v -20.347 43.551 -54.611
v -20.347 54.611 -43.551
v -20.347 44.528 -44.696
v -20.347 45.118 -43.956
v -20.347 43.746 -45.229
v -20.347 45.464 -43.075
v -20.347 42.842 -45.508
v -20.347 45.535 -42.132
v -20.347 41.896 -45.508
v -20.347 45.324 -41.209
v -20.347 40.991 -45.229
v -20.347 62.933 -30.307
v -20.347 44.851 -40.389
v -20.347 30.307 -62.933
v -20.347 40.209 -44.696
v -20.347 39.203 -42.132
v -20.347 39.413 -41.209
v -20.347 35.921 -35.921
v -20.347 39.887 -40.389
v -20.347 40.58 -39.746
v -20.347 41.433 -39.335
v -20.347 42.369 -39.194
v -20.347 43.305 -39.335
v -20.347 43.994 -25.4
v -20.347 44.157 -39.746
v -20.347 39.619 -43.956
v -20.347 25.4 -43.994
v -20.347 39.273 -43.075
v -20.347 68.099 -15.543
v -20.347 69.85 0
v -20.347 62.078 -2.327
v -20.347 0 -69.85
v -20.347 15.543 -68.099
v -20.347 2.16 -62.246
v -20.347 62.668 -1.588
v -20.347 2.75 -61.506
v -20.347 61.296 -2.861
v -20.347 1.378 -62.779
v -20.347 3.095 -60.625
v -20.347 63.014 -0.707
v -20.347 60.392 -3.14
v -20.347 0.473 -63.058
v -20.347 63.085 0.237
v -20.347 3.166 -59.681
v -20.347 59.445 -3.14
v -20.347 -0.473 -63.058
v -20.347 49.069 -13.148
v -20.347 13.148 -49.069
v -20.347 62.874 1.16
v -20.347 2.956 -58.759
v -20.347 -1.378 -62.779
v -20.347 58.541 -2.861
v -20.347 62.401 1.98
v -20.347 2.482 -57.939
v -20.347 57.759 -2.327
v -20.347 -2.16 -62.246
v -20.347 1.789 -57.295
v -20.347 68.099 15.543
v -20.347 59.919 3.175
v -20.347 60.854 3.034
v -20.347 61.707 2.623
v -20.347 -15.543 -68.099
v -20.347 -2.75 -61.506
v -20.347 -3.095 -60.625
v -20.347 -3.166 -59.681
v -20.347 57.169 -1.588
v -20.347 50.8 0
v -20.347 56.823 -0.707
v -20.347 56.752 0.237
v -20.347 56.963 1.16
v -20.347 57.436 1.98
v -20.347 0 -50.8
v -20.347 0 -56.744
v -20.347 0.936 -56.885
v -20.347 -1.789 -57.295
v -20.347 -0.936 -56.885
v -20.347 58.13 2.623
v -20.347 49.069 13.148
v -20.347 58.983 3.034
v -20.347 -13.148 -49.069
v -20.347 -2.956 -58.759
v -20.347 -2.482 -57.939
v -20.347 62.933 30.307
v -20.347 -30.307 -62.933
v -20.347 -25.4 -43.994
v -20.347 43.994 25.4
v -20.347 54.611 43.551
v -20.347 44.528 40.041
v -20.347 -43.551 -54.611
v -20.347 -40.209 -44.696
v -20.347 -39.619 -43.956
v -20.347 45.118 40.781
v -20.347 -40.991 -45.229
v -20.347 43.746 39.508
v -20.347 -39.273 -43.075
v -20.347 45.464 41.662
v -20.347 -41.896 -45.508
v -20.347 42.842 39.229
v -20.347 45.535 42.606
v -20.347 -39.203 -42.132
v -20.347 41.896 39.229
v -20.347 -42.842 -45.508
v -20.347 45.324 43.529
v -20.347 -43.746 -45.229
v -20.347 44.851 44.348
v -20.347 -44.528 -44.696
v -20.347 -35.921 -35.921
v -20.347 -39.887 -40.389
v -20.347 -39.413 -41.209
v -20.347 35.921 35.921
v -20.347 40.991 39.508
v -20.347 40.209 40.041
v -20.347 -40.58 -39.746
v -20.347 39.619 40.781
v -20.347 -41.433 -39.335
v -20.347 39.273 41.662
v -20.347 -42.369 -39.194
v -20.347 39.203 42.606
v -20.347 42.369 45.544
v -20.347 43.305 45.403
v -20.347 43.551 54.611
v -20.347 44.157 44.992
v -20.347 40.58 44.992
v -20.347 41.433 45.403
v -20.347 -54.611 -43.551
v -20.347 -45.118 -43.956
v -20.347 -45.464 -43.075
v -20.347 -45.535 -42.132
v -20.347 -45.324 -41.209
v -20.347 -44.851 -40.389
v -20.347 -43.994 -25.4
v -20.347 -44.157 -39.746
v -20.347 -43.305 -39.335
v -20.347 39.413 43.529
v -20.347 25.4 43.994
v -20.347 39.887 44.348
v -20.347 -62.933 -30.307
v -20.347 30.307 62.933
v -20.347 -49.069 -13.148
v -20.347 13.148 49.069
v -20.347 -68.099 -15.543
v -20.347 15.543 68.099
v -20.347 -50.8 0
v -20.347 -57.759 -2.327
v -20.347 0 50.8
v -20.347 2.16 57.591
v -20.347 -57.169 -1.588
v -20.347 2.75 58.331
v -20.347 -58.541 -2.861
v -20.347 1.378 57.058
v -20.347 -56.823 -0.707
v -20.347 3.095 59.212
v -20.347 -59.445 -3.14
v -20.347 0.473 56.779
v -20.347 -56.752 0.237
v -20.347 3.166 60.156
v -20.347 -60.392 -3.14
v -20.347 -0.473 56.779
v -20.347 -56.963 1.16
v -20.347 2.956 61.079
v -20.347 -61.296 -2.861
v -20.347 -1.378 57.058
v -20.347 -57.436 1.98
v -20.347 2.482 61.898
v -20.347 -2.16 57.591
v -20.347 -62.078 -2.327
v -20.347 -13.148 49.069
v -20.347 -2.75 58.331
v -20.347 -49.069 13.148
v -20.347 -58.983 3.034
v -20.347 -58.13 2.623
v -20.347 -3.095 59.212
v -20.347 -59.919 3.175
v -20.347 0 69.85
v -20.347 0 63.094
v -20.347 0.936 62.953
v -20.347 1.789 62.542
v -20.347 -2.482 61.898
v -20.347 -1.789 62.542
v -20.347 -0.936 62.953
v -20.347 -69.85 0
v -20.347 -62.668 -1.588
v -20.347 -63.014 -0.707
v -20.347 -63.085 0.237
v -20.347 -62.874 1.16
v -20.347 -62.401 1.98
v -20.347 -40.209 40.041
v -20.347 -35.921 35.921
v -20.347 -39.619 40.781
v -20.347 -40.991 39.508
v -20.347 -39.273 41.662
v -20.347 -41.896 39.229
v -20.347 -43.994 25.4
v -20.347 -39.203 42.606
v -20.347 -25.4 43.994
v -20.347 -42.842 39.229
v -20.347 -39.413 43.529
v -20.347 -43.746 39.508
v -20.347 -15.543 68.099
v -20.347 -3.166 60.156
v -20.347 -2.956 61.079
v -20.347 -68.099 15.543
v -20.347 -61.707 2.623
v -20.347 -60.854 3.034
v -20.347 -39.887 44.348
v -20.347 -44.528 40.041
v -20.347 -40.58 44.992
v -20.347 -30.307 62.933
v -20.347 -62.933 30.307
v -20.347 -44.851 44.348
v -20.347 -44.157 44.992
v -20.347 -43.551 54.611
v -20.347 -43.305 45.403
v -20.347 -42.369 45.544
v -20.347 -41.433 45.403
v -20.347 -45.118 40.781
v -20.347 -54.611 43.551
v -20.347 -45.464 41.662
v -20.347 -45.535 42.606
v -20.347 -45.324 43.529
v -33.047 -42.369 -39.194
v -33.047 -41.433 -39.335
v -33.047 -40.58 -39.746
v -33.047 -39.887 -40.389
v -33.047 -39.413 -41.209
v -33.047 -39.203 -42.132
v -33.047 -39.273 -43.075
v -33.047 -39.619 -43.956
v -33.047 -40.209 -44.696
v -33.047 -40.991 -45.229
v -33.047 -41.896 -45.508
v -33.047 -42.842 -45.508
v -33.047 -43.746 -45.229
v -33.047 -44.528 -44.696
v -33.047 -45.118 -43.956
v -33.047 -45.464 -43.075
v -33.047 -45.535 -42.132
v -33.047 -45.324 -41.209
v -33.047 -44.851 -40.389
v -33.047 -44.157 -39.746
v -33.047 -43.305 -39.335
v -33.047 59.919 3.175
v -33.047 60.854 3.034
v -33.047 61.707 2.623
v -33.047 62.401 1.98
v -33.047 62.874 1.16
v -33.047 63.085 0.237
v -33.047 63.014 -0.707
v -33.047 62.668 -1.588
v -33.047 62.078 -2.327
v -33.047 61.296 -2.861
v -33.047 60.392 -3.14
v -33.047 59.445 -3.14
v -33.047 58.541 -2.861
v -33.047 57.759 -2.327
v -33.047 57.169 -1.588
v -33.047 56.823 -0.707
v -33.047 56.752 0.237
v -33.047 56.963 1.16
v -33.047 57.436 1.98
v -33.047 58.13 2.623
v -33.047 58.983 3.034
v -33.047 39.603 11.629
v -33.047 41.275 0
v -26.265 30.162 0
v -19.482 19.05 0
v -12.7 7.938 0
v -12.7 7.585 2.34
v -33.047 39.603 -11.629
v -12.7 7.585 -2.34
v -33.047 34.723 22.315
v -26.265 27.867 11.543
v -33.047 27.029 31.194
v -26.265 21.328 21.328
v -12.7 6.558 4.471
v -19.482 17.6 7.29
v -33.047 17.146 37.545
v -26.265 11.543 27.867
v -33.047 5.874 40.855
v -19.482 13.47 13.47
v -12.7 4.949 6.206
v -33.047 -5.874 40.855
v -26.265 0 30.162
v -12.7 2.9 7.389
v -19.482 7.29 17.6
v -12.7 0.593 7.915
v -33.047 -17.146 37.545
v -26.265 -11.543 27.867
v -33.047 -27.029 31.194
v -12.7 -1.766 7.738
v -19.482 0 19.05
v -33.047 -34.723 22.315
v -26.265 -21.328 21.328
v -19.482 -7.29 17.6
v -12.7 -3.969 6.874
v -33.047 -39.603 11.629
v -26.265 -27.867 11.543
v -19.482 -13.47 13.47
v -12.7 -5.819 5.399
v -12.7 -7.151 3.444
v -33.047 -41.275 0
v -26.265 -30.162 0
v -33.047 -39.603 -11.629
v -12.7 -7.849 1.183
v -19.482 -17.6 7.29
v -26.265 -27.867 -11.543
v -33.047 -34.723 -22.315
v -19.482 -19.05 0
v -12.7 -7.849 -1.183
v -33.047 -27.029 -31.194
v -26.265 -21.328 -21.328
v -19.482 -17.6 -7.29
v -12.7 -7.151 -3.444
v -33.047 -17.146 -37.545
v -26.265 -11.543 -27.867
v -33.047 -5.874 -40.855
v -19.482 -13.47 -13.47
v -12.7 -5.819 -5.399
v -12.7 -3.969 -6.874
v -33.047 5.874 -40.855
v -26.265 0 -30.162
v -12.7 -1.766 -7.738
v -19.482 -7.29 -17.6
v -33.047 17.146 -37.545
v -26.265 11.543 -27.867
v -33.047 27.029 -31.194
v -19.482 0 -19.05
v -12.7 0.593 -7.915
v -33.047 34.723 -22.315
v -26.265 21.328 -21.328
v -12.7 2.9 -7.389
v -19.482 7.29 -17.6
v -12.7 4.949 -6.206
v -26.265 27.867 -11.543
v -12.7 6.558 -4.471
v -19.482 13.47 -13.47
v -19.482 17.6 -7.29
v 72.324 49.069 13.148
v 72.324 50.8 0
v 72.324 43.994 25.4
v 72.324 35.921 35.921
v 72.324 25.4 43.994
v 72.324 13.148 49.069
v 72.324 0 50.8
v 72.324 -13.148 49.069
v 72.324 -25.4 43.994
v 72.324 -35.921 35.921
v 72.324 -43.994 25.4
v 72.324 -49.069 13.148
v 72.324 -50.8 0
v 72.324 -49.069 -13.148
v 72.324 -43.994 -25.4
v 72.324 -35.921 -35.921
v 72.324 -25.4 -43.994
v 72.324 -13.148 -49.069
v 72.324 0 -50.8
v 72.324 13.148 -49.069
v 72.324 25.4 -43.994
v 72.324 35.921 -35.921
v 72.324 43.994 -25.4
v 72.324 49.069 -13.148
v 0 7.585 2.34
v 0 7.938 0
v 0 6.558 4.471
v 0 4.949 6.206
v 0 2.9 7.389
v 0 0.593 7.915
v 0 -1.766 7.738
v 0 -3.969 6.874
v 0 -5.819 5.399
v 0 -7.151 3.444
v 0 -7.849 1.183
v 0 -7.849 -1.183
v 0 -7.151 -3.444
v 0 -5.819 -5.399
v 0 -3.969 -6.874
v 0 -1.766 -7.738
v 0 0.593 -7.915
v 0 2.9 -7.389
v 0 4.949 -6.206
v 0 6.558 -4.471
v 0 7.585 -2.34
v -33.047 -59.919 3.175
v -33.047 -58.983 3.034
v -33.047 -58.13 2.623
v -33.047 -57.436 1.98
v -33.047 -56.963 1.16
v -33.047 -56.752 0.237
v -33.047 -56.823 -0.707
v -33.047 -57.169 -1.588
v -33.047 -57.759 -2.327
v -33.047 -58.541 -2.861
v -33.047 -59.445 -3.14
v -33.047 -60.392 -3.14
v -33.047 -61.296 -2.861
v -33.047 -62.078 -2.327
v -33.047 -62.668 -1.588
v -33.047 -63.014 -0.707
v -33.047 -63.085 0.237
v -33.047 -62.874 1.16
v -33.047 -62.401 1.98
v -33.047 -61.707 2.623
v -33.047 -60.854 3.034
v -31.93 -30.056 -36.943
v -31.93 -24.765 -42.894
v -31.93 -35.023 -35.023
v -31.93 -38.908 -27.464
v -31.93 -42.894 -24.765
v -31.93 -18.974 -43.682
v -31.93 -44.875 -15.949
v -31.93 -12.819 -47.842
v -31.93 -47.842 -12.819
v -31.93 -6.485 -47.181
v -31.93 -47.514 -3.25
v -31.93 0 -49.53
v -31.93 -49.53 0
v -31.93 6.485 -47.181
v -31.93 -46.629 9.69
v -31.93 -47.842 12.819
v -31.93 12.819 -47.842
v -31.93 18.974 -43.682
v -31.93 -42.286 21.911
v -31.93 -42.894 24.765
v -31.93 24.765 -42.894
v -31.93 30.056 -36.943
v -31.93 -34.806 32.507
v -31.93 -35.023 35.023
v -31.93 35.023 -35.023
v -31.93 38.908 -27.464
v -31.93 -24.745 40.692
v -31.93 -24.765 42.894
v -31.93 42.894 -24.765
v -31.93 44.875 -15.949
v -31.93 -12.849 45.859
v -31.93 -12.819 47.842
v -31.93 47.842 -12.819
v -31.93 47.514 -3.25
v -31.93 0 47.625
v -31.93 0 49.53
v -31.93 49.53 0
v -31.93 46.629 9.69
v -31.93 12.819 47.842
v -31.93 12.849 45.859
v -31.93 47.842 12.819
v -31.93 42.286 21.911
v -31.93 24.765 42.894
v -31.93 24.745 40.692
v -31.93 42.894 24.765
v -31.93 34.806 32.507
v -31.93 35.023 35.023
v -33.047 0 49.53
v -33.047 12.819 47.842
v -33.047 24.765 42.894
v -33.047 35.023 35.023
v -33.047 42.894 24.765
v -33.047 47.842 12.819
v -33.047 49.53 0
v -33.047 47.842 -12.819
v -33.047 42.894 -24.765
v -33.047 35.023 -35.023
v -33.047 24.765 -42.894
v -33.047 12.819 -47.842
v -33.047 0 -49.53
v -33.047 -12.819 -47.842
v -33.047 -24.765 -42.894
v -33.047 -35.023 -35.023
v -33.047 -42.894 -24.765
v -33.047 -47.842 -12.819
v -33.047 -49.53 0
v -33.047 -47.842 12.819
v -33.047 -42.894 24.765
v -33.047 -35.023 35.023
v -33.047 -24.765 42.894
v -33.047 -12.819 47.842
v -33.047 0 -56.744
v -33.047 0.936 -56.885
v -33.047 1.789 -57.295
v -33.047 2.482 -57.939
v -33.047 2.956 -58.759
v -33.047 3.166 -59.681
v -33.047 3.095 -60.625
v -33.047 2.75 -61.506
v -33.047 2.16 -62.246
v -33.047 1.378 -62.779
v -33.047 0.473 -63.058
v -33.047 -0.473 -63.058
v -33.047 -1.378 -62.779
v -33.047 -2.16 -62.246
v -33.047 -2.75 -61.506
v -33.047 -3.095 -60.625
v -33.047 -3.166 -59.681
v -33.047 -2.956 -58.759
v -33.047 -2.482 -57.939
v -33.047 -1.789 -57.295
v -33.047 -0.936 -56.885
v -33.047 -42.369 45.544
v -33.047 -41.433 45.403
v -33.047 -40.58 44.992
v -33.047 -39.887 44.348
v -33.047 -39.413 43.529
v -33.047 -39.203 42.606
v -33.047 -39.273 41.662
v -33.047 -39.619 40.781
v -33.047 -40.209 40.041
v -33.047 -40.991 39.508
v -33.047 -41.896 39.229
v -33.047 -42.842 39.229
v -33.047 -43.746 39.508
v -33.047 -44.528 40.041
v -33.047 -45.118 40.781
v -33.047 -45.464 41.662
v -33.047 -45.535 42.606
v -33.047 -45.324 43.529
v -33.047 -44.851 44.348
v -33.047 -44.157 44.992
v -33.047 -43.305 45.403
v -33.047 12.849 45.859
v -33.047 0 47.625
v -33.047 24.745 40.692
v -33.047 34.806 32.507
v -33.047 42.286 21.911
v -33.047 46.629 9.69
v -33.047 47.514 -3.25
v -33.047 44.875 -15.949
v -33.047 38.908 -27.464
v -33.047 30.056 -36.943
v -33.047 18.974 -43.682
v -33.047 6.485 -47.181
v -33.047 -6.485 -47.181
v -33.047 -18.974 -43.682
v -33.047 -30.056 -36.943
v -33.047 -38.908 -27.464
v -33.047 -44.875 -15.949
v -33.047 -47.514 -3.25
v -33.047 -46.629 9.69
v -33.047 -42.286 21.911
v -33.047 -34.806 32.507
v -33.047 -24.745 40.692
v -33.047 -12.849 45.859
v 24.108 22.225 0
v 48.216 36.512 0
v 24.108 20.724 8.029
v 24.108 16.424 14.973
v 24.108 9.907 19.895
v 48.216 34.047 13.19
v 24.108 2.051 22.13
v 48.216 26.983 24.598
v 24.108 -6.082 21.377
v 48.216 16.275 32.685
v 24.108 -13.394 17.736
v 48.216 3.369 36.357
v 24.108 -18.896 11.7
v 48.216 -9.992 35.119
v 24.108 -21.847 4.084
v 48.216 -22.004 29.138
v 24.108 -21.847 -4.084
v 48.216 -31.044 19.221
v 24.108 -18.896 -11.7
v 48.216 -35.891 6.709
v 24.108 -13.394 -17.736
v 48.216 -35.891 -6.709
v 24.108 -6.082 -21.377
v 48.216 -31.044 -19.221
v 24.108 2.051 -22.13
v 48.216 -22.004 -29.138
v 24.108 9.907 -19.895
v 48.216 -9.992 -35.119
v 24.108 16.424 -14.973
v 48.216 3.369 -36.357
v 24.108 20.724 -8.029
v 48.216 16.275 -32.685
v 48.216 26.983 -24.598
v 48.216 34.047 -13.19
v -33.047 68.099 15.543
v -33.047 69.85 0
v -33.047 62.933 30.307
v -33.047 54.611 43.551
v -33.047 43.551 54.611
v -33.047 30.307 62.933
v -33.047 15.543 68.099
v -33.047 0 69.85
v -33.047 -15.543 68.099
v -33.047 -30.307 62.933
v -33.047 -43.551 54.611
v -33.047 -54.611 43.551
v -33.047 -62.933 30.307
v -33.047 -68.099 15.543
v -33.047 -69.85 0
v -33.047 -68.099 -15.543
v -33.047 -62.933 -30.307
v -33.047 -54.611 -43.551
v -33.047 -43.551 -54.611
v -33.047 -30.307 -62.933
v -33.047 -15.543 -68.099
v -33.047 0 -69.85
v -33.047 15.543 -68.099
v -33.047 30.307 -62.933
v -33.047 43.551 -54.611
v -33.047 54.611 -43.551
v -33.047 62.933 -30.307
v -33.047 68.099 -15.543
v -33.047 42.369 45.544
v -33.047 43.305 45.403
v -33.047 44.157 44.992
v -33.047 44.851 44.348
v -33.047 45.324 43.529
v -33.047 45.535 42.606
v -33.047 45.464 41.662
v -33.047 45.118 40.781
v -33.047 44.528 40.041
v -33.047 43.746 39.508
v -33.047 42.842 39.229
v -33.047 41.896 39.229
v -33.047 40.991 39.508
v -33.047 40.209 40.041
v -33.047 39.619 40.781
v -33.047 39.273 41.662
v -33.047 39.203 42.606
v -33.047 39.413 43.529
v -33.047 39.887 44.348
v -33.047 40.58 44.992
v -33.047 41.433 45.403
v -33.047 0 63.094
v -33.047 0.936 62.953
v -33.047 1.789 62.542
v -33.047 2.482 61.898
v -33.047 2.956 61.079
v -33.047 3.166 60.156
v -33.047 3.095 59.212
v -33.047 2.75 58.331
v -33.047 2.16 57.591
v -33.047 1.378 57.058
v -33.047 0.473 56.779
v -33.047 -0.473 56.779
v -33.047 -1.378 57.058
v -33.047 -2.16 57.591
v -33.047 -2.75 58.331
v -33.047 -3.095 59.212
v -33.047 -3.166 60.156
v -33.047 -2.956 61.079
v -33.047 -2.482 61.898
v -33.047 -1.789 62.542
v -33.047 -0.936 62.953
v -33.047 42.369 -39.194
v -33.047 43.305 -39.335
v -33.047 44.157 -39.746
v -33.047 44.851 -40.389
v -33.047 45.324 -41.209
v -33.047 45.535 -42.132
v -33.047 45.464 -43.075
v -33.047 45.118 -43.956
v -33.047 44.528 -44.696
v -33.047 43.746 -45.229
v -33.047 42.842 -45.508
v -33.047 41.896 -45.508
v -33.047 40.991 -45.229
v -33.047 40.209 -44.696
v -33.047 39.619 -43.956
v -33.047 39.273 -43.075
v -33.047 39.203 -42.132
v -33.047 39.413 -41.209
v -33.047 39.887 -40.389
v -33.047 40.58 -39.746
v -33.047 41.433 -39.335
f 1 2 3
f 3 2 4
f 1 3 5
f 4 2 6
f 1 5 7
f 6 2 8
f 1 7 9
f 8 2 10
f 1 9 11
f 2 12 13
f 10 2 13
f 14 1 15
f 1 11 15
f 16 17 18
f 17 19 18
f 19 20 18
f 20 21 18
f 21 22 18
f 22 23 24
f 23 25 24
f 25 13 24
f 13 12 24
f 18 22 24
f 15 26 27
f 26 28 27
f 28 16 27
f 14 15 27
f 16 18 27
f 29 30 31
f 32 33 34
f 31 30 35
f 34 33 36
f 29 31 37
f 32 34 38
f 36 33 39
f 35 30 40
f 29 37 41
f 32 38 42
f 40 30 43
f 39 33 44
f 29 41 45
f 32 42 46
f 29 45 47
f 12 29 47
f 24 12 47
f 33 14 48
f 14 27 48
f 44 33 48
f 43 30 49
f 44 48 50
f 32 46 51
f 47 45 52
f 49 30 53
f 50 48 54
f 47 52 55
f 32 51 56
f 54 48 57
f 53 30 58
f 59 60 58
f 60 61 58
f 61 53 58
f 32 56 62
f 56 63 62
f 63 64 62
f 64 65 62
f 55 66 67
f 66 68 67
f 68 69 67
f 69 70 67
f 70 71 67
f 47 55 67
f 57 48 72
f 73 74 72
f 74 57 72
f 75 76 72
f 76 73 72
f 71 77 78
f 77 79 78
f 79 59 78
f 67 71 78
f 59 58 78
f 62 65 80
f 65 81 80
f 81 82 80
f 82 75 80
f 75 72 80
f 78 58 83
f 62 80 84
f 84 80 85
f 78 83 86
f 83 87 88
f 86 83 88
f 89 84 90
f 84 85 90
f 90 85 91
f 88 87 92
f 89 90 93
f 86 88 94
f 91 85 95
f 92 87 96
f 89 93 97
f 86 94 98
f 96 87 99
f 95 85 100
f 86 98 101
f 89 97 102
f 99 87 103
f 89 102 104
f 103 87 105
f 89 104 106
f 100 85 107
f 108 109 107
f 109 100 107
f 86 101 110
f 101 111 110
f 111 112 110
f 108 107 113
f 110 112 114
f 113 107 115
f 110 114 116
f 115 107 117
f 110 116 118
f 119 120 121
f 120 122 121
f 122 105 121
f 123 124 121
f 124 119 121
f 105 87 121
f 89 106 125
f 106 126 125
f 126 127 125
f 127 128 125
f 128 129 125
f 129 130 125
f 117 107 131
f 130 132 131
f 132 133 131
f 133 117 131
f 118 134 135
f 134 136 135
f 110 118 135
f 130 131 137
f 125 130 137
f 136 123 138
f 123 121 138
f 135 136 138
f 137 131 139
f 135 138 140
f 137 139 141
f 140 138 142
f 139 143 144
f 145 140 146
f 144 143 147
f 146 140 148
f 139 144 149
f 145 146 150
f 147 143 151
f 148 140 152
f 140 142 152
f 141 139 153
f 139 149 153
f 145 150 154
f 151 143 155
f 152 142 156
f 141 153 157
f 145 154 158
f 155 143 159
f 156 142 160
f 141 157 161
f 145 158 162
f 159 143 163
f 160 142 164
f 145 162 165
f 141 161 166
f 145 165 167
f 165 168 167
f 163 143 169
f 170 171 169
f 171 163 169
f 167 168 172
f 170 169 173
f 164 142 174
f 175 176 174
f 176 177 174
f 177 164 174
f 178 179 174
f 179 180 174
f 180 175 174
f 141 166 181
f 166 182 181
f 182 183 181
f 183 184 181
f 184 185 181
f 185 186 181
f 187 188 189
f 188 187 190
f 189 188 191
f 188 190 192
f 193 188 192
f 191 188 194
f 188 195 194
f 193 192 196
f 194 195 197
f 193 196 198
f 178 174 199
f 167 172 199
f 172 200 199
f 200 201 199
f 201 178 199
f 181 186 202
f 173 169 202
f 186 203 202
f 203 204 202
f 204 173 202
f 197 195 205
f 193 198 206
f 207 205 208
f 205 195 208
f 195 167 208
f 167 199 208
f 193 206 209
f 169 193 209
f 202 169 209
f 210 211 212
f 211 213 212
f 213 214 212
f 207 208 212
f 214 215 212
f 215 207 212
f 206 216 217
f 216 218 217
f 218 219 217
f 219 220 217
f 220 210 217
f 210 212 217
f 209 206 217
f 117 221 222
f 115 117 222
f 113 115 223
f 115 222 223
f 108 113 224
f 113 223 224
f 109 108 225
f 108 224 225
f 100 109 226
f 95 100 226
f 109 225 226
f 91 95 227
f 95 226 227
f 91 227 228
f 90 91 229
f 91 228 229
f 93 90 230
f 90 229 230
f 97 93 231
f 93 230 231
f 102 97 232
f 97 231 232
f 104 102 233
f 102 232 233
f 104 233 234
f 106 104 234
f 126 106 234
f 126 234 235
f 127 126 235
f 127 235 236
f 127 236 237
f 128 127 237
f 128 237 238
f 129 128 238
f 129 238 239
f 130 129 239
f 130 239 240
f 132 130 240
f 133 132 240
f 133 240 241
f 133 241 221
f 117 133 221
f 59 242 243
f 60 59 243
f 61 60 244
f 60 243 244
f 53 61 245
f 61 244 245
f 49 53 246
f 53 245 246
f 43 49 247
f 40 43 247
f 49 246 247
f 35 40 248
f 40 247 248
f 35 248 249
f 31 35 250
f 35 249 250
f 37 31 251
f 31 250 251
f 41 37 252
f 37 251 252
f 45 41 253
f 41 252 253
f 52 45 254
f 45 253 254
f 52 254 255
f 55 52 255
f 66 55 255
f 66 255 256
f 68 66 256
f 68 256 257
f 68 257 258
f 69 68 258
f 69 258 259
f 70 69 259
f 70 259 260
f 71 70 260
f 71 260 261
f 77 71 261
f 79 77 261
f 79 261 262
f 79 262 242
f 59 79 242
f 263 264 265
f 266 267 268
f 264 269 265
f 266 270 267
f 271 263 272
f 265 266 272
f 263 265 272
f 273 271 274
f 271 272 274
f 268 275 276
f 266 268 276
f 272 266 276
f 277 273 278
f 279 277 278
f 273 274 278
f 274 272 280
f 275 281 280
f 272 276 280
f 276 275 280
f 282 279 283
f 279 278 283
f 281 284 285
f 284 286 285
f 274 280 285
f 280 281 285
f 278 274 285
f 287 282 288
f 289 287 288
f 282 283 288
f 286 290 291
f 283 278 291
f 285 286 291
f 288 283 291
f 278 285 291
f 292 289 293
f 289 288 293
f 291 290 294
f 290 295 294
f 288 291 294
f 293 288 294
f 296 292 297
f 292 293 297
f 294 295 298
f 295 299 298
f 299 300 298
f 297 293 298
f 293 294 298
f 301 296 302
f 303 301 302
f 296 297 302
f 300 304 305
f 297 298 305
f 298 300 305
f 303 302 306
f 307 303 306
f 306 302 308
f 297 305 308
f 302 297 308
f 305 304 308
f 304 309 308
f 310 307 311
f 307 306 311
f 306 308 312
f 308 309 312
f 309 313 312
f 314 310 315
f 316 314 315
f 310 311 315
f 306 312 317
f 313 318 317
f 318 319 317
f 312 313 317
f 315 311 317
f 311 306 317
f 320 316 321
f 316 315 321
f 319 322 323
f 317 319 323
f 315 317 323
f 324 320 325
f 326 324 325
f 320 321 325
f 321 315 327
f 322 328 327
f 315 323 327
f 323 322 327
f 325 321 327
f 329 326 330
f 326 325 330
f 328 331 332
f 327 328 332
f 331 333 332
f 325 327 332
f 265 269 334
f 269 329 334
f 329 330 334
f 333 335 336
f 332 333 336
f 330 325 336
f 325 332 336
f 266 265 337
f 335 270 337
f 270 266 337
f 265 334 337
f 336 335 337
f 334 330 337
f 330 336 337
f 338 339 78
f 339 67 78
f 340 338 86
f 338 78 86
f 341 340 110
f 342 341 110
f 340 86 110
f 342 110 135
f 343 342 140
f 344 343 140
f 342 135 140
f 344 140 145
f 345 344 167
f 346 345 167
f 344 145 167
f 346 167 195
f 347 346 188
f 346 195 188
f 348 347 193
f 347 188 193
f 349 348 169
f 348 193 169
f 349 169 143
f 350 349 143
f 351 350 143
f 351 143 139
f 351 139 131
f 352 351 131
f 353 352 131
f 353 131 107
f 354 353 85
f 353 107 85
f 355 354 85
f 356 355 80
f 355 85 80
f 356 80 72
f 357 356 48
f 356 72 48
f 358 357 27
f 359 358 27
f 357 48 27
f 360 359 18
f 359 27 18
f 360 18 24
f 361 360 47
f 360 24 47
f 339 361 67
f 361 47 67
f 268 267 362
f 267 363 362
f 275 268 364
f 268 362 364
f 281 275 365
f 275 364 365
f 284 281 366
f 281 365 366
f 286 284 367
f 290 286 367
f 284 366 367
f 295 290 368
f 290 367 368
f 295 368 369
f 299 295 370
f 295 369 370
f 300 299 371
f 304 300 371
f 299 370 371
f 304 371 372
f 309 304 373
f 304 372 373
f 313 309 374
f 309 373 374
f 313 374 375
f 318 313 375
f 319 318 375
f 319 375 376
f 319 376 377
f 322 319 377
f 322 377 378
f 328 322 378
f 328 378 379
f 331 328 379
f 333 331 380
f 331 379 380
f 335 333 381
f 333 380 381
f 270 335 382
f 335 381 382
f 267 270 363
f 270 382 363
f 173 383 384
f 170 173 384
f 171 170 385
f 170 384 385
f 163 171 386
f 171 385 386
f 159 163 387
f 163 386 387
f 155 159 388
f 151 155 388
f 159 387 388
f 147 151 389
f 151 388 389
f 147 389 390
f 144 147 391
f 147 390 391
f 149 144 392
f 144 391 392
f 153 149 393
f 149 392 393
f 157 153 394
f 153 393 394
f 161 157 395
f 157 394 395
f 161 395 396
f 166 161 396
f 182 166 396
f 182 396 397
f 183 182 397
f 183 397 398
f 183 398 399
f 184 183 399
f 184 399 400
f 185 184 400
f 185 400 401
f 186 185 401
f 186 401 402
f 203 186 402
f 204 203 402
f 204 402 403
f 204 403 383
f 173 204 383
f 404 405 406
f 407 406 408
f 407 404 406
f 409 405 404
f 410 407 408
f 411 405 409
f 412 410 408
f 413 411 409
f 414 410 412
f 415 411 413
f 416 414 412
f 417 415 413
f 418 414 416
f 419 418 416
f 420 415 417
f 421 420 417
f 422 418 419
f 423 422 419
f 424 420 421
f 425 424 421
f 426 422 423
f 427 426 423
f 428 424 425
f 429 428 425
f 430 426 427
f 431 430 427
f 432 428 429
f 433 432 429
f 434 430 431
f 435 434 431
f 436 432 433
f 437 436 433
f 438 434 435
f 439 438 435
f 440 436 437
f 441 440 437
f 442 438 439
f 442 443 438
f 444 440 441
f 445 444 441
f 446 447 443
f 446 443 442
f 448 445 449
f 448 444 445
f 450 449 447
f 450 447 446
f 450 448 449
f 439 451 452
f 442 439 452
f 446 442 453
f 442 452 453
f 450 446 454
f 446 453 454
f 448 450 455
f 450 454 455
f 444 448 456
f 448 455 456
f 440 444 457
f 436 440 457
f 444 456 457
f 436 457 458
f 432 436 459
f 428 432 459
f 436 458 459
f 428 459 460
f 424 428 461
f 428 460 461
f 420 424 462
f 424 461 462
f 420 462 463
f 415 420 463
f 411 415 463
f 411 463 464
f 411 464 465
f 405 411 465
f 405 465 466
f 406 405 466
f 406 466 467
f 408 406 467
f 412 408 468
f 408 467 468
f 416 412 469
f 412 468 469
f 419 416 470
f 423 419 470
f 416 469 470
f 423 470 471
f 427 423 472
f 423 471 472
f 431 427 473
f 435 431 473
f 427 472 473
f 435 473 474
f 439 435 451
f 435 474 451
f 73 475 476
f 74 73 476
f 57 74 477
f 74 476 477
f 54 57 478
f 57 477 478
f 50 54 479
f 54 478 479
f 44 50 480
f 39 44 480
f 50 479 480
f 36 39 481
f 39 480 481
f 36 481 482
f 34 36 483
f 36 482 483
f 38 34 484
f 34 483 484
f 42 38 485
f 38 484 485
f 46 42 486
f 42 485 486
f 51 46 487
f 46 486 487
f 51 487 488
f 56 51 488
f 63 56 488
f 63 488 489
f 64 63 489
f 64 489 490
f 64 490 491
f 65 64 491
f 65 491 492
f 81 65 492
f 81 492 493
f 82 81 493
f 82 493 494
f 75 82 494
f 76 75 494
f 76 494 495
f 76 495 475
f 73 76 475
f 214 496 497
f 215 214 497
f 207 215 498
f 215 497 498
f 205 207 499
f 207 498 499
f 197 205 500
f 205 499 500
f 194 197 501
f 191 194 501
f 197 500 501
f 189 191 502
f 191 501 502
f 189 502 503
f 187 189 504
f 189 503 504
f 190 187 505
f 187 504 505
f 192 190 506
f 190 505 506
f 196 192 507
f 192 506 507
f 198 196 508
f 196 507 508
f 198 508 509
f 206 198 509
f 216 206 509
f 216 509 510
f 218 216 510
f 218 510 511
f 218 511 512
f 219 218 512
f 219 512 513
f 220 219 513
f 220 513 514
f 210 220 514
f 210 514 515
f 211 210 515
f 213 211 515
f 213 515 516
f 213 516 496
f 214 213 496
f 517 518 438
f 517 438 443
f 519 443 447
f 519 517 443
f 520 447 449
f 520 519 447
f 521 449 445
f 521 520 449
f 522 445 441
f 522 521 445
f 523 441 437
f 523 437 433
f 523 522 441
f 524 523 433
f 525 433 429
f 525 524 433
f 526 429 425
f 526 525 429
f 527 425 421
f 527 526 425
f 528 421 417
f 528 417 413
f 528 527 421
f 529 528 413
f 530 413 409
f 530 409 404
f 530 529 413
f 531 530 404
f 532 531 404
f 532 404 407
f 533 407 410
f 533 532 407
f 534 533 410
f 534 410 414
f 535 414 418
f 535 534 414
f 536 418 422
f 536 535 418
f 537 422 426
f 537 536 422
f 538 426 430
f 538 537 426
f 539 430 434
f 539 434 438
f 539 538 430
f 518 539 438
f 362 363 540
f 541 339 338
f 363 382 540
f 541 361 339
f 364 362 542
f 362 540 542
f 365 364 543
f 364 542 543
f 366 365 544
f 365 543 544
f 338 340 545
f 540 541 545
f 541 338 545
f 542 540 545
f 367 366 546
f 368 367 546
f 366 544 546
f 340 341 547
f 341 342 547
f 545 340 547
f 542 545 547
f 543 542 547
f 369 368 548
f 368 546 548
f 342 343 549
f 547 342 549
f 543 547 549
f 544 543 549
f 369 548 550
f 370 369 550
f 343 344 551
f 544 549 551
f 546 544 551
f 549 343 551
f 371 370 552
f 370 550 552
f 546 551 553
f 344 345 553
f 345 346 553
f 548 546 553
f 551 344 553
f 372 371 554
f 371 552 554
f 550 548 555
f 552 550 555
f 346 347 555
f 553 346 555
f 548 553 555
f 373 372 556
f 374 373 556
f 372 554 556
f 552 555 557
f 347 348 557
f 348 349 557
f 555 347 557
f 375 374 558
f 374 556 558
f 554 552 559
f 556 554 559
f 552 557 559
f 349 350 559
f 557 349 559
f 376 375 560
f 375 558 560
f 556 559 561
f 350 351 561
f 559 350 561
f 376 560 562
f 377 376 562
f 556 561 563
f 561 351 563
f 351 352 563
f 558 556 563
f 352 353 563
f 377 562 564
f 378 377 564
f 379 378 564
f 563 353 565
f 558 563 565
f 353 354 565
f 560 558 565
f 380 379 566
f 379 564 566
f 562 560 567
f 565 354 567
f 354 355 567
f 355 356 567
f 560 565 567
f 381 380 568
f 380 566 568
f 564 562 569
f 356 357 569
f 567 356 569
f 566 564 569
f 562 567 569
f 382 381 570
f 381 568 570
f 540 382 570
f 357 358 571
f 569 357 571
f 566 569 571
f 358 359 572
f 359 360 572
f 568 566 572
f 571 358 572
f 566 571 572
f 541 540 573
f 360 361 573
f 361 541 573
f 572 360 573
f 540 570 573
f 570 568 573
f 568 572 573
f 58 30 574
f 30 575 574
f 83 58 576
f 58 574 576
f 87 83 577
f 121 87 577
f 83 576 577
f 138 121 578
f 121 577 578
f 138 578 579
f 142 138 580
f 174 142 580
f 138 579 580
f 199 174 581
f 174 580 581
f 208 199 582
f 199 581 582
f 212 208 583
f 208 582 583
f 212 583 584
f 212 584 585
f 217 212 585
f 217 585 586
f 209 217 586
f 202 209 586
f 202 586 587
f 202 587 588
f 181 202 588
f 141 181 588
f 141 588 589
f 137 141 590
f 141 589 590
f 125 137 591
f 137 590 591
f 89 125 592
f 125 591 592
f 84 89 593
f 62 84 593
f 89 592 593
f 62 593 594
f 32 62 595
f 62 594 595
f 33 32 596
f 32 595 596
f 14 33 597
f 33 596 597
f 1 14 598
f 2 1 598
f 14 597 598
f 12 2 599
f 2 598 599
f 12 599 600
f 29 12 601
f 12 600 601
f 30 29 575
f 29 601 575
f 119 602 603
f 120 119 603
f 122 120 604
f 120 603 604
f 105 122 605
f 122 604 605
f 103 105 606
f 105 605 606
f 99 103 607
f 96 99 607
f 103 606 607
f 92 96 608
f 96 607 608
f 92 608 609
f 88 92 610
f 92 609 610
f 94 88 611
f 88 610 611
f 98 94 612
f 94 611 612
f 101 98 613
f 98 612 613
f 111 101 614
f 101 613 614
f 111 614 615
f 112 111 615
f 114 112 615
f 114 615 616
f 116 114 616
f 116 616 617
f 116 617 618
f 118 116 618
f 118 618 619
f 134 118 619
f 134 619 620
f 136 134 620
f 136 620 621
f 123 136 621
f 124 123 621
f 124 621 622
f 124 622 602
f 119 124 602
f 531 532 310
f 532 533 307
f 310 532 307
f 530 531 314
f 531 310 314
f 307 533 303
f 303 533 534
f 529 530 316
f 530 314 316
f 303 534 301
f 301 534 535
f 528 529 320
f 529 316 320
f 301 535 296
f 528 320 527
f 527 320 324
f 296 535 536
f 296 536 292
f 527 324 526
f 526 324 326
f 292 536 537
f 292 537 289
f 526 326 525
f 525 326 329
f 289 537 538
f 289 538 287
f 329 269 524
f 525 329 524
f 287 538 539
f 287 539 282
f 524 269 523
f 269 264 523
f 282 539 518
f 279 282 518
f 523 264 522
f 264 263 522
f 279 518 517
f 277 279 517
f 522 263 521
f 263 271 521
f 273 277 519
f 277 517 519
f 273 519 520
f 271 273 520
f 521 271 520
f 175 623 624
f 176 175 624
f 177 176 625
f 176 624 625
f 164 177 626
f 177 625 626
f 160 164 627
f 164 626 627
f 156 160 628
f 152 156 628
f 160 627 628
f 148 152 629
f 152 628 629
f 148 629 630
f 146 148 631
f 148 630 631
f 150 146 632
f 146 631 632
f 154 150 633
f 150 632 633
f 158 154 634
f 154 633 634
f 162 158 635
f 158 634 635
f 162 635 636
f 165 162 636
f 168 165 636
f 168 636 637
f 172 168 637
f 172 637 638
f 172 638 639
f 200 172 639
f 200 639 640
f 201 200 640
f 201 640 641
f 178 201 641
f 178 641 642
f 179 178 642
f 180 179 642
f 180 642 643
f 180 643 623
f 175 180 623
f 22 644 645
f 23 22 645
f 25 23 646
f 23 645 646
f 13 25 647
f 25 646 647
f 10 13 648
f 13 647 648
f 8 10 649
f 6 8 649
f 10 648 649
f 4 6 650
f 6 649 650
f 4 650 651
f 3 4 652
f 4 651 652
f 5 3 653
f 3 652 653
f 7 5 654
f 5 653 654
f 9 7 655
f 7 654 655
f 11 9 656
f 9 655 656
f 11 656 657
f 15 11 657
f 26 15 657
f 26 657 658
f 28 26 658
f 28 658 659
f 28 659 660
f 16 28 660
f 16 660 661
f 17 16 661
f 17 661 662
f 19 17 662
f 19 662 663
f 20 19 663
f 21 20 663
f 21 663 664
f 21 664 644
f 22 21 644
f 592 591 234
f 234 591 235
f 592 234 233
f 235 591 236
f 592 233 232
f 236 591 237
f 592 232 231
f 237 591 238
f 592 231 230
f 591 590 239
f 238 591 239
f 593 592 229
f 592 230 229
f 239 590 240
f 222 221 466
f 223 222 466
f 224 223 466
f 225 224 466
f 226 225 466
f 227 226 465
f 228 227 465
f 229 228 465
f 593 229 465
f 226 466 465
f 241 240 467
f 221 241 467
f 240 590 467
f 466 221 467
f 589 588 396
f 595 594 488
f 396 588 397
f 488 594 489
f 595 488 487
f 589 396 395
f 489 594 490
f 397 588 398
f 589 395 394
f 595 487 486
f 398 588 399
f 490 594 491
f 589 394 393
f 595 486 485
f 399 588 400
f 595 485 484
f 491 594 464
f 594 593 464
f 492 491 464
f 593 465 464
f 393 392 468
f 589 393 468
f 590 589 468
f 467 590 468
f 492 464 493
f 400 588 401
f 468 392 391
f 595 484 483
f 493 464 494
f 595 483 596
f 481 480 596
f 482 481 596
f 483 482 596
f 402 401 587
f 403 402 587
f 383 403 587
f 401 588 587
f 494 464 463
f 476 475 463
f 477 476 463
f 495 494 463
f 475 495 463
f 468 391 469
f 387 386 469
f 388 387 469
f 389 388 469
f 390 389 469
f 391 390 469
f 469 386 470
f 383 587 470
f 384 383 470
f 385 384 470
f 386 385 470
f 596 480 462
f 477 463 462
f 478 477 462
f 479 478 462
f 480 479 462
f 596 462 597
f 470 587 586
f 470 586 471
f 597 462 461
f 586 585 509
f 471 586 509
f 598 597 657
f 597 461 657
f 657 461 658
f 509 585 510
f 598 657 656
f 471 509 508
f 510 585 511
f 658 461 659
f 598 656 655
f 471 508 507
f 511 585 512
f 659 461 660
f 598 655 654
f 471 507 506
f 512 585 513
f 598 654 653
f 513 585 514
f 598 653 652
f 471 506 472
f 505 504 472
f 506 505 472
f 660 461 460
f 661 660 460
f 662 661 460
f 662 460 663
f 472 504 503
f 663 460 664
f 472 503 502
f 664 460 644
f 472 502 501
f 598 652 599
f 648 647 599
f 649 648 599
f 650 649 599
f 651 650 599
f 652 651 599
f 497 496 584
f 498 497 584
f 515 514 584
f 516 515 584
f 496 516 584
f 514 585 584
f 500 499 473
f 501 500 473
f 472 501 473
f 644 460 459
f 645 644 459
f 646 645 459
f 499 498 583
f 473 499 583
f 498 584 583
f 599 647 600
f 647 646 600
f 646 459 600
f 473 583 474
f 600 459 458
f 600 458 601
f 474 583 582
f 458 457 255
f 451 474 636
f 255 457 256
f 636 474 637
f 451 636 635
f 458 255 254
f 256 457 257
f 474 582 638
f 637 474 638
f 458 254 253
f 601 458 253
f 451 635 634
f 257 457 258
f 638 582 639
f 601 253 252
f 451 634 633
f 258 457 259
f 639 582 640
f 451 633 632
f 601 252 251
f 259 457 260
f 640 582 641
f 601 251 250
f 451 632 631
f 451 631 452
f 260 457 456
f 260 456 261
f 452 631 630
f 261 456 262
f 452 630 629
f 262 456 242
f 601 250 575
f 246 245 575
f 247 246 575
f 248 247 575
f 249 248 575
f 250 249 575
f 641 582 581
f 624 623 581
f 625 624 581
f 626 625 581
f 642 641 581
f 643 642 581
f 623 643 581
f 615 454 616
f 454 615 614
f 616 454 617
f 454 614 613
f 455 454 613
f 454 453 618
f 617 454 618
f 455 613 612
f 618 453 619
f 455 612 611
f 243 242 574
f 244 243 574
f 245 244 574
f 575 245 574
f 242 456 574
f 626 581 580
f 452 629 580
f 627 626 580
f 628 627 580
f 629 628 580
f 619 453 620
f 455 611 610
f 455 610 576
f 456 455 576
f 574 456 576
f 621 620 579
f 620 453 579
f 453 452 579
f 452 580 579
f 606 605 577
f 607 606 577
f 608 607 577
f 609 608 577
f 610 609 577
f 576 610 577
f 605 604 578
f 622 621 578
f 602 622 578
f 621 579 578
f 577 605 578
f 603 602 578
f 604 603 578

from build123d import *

# Parameters (mm, degrees)
SKETCH2_R          = 49.53
SKETCH2_R_2        = 47.625
CUT_EXTRUDE1_DEPTH = 1.1176
CUT_EXTRUDE2_REACH = 107.371
SKETCH3_R          = 3.175


with BuildPart() as part:
    # Sketch1 → Revolve1 (revolve)
    with BuildSketch(Plane.XY):
        Polygon((0, 7.9375), (72.324156056, 50.8), (-20.347266862, 50.8), (-20.347266862, 69.85), (-33.047266862, 69.85), (-33.047266862, 50.8), (-33.047266862, 41.275), (-12.7, 7.9375), align=None)
    revolve(axis=Axis((0, 0, 0), (1, 0, 0)))

    # Sketch2 → Cut-Extrude1 (cut)
    with BuildSketch(Plane.ZY.offset(33.047266862)):
        Circle(SKETCH2_R)
        Circle(SKETCH2_R_2, mode=Mode.SUBTRACT)
    extrude(amount=-CUT_EXTRUDE1_DEPTH, mode=Mode.SUBTRACT)

    # Sketch3 → Cut-Extrude2 (cut, up to next)
    with BuildSketch(Plane.ZY.offset(33.047266862), mode=Mode.PRIVATE) as cut_extrude2_sk1:
        with Locations((0, 59.9186)):
            Circle(SKETCH3_R)
    cut_extrude2_tool1 = extrude(cut_extrude2_sk1.sketch, amount=-CUT_EXTRUDE2_REACH, mode=Mode.PRIVATE) & part.part
    add(cut_extrude2_tool1.solids().sort_by_distance((-33.047267, 59.9186, 0))[0], mode=Mode.SUBTRACT)
    # Sketch3 → Cut-Extrude2 (cut, up to next)
    with BuildSketch(Plane.ZY.offset(33.047266862), mode=Mode.PRIVATE) as cut_extrude2_sk2:
        with Locations((42.368848379, 42.368848379)):
            Circle(SKETCH3_R)
    cut_extrude2_tool2 = extrude(cut_extrude2_sk2.sketch, amount=-CUT_EXTRUDE2_REACH, mode=Mode.PRIVATE) & part.part
    add(cut_extrude2_tool2.solids().sort_by_distance((-33.047267, 42.368848, 42.368848))[0], mode=Mode.SUBTRACT)
    # Sketch3 → Cut-Extrude2 (cut, up to next)
    with BuildSketch(Plane.ZY.offset(33.047266862), mode=Mode.PRIVATE) as cut_extrude2_sk3:
        with Locations((59.9186, 0)):
            Circle(SKETCH3_R)
    cut_extrude2_tool3 = extrude(cut_extrude2_sk3.sketch, amount=-CUT_EXTRUDE2_REACH, mode=Mode.PRIVATE) & part.part
    add(cut_extrude2_tool3.solids().sort_by_distance((-33.047267, 0, 59.9186))[0], mode=Mode.SUBTRACT)
    # Sketch3 → Cut-Extrude2 (cut, up to next)
    with BuildSketch(Plane.ZY.offset(33.047266862), mode=Mode.PRIVATE) as cut_extrude2_sk4:
        with Locations((42.368848379, -42.368848379)):
            Circle(SKETCH3_R)
    cut_extrude2_tool4 = extrude(cut_extrude2_sk4.sketch, amount=-CUT_EXTRUDE2_REACH, mode=Mode.PRIVATE) & part.part
    add(cut_extrude2_tool4.solids().sort_by_distance((-33.047267, -42.368848, 42.368848))[0], mode=Mode.SUBTRACT)
    # Sketch3 → Cut-Extrude2 (cut, up to next)
    with BuildSketch(Plane.ZY.offset(33.047266862), mode=Mode.PRIVATE) as cut_extrude2_sk5:
        with Locations((0, -59.9186)):
            Circle(SKETCH3_R)
    cut_extrude2_tool5 = extrude(cut_extrude2_sk5.sketch, amount=-CUT_EXTRUDE2_REACH, mode=Mode.PRIVATE) & part.part
    add(cut_extrude2_tool5.solids().sort_by_distance((-33.047267, -59.9186, 0))[0], mode=Mode.SUBTRACT)
    # Sketch3 → Cut-Extrude2 (cut, up to next)
    with BuildSketch(Plane.ZY.offset(33.047266862), mode=Mode.PRIVATE) as cut_extrude2_sk6:
        with Locations((-42.368848379, -42.368848379)):
            Circle(SKETCH3_R)
    cut_extrude2_tool6 = extrude(cut_extrude2_sk6.sketch, amount=-CUT_EXTRUDE2_REACH, mode=Mode.PRIVATE) & part.part
    add(cut_extrude2_tool6.solids().sort_by_distance((-33.047267, -42.368848, -42.368848))[0], mode=Mode.SUBTRACT)
    # Sketch3 → Cut-Extrude2 (cut, up to next)
    with BuildSketch(Plane.ZY.offset(33.047266862), mode=Mode.PRIVATE) as cut_extrude2_sk7:
        with Locations((-59.9186, 0)):
            Circle(SKETCH3_R)
    cut_extrude2_tool7 = extrude(cut_extrude2_sk7.sketch, amount=-CUT_EXTRUDE2_REACH, mode=Mode.PRIVATE) & part.part
    add(cut_extrude2_tool7.solids().sort_by_distance((-33.047267, 0, -59.9186))[0], mode=Mode.SUBTRACT)
    # Sketch3 → Cut-Extrude2 (cut, up to next)
    with BuildSketch(Plane.ZY.offset(33.047266862), mode=Mode.PRIVATE) as cut_extrude2_sk8:
        with Locations((-42.368848379, 42.368848379)):
            Circle(SKETCH3_R)
    cut_extrude2_tool8 = extrude(cut_extrude2_sk8.sketch, amount=-CUT_EXTRUDE2_REACH, mode=Mode.PRIVATE) & part.part
    add(cut_extrude2_tool8.solids().sort_by_distance((-33.047267, 42.368848, -42.368848))[0], mode=Mode.SUBTRACT)


solid = part.part
